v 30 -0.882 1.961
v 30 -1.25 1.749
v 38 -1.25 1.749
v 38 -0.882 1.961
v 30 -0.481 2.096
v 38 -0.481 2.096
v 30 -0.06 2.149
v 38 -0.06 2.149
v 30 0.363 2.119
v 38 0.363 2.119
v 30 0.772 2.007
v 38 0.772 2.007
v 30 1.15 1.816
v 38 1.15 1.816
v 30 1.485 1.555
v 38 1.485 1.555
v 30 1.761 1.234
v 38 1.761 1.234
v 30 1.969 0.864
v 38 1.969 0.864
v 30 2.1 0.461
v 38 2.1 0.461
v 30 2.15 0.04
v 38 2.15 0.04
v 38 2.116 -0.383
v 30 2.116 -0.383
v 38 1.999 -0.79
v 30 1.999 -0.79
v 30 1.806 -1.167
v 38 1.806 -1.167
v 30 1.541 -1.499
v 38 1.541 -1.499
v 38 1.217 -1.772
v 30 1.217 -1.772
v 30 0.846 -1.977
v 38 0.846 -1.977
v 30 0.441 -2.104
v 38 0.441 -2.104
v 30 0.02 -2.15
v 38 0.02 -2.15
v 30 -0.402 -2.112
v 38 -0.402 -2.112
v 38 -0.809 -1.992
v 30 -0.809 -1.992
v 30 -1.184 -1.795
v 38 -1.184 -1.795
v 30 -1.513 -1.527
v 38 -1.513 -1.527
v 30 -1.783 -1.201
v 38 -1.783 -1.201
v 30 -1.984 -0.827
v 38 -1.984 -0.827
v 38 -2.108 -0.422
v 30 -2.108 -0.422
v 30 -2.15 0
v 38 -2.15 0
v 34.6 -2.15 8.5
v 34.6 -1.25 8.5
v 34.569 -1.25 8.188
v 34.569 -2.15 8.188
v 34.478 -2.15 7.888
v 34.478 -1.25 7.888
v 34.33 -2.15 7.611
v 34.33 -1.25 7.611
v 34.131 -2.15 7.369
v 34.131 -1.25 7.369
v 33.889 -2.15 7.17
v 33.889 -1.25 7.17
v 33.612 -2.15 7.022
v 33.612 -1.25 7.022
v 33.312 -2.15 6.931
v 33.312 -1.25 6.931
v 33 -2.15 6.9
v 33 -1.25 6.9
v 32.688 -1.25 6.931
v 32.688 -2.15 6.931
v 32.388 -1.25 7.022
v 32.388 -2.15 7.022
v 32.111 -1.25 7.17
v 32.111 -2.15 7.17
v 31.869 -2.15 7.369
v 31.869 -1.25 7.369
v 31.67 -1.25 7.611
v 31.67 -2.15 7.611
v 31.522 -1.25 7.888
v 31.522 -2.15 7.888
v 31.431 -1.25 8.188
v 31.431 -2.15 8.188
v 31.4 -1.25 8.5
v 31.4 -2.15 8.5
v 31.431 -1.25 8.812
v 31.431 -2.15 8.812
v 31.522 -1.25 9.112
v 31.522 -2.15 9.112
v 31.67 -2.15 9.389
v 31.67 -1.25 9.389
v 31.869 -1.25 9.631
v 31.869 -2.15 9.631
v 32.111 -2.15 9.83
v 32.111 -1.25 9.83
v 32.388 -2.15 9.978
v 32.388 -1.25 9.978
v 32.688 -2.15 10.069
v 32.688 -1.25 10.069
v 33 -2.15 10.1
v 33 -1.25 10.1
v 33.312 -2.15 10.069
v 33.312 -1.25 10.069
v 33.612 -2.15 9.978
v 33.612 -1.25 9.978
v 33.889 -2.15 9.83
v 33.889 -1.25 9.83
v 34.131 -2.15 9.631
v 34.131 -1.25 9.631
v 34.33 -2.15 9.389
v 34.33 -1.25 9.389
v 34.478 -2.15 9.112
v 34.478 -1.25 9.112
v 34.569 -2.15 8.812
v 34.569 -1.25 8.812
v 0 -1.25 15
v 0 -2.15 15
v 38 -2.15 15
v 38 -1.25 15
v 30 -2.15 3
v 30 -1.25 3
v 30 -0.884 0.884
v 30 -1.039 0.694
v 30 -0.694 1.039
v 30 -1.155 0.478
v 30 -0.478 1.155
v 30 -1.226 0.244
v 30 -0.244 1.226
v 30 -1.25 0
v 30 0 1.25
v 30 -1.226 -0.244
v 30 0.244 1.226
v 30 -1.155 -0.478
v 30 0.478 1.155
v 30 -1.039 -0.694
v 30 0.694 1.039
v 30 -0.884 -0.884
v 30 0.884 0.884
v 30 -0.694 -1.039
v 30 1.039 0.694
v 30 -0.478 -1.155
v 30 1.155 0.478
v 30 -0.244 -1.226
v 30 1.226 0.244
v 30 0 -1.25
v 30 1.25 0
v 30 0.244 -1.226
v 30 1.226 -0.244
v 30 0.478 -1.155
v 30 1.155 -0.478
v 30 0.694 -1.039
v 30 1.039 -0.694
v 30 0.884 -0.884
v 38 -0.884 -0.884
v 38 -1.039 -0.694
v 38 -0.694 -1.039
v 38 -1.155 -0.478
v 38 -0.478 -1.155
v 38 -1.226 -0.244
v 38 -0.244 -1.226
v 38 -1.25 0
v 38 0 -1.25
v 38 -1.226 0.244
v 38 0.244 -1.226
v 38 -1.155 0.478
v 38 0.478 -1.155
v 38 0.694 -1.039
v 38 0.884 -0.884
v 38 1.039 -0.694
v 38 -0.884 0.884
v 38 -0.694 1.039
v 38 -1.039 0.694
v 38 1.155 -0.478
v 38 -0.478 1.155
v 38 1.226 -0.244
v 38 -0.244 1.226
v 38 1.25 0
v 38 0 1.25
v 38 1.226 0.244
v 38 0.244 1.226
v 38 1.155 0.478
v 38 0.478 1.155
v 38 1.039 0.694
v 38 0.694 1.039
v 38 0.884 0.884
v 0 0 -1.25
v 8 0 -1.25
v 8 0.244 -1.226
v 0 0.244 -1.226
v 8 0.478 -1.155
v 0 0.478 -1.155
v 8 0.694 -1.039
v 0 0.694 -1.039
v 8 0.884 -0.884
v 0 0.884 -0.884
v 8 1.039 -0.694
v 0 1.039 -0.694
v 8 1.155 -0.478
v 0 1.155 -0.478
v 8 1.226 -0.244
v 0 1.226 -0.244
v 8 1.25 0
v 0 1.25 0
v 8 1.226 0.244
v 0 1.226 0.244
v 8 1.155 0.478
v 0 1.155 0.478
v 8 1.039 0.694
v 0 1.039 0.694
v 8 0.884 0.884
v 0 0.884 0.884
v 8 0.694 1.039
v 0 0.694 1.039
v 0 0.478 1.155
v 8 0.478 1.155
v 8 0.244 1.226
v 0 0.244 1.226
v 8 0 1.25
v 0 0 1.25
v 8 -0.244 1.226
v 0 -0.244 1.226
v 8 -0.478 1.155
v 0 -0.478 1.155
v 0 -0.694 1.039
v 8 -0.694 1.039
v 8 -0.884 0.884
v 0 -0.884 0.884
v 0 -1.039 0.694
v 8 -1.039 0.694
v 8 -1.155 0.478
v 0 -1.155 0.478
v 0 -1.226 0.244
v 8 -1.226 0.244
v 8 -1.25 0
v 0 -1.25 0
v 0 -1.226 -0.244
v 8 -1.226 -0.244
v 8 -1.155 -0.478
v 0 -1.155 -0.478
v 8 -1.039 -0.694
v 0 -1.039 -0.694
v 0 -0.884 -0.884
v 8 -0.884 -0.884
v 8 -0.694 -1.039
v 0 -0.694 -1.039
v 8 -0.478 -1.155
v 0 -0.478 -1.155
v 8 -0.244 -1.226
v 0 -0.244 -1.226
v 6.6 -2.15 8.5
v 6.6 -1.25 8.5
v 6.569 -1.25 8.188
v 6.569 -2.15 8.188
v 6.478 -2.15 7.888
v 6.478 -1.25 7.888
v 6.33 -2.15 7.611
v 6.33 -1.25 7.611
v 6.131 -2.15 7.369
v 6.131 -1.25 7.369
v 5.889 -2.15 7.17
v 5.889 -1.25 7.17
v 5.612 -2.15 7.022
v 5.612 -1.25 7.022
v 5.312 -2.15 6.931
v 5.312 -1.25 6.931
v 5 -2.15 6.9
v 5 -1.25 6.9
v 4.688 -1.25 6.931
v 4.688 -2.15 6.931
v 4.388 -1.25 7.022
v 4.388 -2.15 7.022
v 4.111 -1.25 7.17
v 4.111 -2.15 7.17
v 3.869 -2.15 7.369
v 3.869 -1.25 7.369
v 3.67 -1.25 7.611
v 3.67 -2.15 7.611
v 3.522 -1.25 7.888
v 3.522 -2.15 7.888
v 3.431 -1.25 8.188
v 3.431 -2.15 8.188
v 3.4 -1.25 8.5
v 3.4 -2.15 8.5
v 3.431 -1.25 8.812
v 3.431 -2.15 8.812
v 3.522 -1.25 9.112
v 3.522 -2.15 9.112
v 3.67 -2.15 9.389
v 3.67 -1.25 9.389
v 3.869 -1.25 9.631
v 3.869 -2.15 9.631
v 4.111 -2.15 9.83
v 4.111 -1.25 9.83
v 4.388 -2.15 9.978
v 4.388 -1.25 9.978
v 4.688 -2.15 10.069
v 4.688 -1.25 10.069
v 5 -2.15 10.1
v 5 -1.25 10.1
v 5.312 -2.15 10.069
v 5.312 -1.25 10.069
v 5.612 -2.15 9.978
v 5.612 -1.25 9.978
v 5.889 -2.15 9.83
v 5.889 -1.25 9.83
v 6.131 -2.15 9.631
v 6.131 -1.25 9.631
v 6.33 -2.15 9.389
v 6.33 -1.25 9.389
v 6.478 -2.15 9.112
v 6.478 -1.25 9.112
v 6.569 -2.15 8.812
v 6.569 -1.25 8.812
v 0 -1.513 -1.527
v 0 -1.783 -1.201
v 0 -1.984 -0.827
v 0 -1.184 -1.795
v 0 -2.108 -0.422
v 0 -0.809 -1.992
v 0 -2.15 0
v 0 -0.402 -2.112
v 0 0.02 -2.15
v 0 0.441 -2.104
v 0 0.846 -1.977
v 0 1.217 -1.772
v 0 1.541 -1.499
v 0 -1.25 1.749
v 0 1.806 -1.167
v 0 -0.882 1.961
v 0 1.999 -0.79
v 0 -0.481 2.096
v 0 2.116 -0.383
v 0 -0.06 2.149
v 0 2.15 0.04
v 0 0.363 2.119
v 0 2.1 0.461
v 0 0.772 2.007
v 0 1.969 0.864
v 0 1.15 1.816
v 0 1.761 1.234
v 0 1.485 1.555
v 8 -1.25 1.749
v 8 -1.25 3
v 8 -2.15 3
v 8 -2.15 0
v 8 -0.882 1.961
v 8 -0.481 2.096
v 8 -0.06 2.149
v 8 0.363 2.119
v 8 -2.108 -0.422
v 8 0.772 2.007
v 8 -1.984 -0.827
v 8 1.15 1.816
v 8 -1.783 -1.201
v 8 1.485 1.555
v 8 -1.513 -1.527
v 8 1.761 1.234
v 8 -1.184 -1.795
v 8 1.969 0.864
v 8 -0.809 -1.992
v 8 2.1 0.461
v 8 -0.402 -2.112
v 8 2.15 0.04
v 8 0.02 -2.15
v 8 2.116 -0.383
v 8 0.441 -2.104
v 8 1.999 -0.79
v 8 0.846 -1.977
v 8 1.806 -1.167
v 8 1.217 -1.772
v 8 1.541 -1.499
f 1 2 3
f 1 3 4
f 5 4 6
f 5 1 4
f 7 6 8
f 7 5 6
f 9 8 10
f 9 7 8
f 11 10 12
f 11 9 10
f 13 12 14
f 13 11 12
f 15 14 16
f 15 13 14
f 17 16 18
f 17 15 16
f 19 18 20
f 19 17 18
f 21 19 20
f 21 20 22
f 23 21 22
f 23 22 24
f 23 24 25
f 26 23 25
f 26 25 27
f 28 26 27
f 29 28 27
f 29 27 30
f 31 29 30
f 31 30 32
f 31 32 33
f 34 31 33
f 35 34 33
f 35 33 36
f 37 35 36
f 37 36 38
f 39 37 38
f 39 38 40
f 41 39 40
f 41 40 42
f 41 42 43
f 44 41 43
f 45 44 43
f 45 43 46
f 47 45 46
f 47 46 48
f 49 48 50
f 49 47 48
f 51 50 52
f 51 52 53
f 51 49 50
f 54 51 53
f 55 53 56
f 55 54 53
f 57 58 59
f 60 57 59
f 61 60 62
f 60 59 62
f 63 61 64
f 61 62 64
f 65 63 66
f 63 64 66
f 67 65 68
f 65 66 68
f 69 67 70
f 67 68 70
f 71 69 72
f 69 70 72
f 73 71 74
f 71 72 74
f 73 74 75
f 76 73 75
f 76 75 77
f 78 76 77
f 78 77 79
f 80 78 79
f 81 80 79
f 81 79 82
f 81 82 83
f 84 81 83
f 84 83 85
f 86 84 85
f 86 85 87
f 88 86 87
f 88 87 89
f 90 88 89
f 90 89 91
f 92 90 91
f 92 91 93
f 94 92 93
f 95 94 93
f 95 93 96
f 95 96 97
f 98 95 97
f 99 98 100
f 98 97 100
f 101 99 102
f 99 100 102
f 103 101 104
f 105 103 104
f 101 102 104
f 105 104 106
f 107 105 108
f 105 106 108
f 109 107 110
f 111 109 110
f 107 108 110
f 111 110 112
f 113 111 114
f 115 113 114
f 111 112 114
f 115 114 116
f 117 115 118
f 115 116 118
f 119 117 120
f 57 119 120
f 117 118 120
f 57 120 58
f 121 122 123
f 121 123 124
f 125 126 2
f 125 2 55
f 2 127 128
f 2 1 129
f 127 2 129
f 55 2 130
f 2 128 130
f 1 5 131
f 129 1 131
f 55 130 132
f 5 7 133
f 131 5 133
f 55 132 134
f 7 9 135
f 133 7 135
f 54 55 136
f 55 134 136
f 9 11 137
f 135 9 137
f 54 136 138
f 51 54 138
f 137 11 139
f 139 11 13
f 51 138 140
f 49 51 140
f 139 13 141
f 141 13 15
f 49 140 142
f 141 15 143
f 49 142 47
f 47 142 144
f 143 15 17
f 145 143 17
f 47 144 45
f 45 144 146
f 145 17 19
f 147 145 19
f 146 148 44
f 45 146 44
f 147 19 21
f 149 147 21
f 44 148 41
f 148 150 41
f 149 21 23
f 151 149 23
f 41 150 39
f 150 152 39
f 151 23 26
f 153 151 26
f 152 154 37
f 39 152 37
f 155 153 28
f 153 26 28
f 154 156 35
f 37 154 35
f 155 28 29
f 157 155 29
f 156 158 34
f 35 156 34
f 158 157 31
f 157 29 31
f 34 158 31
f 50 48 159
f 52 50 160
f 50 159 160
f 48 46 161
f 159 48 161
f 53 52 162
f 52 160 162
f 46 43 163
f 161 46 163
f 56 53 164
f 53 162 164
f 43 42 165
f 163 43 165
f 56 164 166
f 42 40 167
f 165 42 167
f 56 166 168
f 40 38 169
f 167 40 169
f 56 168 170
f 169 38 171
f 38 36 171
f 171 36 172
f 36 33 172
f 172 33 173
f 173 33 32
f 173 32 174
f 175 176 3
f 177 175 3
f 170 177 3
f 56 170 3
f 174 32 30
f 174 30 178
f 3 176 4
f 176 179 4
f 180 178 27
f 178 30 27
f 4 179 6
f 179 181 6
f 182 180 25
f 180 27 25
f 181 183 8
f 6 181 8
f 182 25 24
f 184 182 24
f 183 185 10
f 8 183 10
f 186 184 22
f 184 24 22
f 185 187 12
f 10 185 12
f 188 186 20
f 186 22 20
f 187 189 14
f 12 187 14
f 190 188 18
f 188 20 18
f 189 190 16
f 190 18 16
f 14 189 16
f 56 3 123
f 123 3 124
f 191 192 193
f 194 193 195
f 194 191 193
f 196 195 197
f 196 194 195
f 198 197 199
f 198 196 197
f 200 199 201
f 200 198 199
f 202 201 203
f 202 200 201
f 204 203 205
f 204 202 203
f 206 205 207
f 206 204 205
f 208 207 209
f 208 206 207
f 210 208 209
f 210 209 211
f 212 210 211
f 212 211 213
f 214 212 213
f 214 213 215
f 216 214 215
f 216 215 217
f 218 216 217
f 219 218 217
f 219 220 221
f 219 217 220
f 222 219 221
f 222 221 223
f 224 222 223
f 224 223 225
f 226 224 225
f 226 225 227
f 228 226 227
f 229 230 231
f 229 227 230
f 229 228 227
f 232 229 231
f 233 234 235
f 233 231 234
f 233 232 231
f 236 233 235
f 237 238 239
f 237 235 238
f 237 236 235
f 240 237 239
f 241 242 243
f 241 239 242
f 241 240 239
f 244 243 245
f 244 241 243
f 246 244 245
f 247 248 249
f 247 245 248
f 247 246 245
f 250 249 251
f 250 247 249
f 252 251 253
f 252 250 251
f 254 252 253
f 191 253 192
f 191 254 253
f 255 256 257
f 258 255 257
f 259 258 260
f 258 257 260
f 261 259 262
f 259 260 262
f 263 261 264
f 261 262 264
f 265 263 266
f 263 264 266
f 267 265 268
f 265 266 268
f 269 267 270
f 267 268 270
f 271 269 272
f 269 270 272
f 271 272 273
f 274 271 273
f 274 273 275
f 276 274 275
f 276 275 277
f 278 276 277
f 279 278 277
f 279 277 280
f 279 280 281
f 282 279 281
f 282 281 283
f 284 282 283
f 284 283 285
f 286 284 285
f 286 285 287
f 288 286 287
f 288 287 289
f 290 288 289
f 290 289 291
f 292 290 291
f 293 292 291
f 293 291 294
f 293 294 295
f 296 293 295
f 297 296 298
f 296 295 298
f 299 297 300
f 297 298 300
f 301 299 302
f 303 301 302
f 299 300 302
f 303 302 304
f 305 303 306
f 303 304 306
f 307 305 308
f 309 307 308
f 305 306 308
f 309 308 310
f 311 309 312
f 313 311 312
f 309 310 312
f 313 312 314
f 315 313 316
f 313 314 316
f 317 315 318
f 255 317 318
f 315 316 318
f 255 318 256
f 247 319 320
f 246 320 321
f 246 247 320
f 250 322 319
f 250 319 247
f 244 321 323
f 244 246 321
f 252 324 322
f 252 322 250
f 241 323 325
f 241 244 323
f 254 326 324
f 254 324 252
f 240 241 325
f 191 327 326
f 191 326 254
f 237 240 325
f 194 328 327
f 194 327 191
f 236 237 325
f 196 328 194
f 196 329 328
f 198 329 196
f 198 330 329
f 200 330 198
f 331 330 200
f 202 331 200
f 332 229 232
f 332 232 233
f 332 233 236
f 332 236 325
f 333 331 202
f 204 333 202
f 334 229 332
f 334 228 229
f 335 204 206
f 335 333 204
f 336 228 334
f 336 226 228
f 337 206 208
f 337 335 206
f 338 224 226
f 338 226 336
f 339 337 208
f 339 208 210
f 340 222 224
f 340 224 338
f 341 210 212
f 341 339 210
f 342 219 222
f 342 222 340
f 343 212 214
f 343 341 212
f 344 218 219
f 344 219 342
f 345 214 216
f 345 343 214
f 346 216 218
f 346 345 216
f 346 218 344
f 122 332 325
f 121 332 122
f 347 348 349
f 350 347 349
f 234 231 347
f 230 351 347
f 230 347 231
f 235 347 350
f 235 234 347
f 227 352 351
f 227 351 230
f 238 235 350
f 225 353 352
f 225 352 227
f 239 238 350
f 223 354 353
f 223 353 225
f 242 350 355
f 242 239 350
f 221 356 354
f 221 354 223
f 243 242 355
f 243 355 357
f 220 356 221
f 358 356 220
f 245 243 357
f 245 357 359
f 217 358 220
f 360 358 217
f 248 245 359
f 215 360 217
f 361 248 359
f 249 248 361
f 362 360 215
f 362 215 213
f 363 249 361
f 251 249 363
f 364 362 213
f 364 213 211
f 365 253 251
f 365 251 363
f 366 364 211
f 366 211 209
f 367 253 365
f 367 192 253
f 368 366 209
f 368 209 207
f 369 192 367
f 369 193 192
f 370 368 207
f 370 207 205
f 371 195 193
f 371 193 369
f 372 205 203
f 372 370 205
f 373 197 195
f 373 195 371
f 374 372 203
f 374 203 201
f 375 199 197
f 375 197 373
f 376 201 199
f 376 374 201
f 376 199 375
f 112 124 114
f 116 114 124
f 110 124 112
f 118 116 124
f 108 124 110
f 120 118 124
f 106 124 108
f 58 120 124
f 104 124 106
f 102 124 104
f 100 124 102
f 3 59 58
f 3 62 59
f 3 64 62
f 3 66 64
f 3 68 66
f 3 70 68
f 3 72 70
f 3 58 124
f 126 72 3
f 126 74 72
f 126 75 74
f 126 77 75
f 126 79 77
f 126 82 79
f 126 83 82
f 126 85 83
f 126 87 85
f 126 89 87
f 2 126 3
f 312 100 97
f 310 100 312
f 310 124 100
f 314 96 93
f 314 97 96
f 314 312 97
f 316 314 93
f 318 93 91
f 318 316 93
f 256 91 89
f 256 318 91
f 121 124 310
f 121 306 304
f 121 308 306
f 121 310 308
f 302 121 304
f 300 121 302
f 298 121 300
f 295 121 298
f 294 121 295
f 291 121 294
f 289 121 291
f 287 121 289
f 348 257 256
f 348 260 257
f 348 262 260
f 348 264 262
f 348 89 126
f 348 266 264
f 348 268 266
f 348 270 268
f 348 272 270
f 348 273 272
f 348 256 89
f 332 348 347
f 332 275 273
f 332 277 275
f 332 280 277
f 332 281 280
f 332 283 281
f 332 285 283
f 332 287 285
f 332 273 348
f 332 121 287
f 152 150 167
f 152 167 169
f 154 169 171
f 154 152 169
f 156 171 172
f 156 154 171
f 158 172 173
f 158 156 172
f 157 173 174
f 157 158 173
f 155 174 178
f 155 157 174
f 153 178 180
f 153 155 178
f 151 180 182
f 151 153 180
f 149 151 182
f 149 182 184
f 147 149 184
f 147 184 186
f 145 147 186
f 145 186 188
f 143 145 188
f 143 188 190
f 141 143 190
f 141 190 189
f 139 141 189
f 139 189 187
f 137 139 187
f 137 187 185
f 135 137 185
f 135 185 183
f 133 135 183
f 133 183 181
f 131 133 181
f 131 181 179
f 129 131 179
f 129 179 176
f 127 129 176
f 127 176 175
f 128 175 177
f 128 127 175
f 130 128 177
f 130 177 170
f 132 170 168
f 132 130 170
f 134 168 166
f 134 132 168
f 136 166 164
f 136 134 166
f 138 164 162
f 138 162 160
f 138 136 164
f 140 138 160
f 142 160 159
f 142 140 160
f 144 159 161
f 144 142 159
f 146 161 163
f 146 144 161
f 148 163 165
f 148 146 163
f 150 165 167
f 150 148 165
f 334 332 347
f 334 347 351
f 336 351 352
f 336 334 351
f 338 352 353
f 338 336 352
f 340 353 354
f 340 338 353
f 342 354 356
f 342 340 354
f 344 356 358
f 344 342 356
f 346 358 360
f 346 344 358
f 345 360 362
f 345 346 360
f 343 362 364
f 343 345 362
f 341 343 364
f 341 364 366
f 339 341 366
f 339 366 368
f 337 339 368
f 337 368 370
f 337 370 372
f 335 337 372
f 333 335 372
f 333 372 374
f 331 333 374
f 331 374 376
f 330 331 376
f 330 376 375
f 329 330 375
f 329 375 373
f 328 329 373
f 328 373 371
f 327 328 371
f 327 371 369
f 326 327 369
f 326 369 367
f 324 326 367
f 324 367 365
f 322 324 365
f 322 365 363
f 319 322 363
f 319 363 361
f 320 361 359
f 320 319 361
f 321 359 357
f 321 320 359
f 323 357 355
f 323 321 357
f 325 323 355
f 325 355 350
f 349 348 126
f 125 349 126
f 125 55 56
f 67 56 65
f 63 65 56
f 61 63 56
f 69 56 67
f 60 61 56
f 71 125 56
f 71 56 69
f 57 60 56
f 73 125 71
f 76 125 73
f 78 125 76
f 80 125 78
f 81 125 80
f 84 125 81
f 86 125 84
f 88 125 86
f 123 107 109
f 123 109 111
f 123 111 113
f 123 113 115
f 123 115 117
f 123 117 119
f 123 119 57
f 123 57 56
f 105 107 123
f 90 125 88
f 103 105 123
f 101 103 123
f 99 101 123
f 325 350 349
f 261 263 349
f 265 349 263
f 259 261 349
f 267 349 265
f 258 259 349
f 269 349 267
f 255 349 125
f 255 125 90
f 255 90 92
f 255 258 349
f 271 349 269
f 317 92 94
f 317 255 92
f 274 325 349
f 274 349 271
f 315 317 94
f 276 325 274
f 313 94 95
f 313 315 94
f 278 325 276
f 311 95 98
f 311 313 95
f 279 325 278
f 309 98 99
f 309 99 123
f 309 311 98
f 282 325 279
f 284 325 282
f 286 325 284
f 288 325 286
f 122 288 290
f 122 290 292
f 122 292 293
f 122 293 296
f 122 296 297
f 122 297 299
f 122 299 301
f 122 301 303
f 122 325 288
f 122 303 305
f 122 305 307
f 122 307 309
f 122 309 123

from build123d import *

# Parameters (mm, degrees)
SKETCH_1_R          = 1.25
EXTRUDE_1_DEPTH     = 38
SKETCH_2_R          = 1.6
SKETCH_2_W          = 22
SKETCH_2_H          = 7.890130192
CUT_EXTRUDE_1_DEPTH = 19


with BuildPart() as part:
    # 草图1 → 凸台-拉伸1 (new body)
    with BuildSketch(Plane(origin=(0, 0, 0), x_dir=(0, 0, -1), z_dir=(1, 0, 0))):
        with BuildLine():
            Line((0, -2.15), (-15, -2.15))
            Line((-15, -2.15), (-15, -1.25))
            Line((-15, -1.25), (-1.749285568, -1.25))
            ThreePointArc((-1.749285568, -1.25), (0.983615779, 1.911805429), (0, -2.15))
        make_face()
        Circle(SKETCH_1_R, mode=Mode.SUBTRACT)
    extrude(amount=EXTRUDE_1_DEPTH)

    # 草图2 → 切除-拉伸1 (cut, symmetric)
    with BuildSketch(Plane(origin=(0, 0, 0), x_dir=(1, 0, 0), z_dir=(0, 1, 0))):
        with Locations((33, -8.5)):
            Circle(SKETCH_2_R)
        with Locations((5, -8.5)):
            Circle(SKETCH_2_R)
        with Locations((19, 0.945065096)):
            Rectangle(SKETCH_2_W, SKETCH_2_H)
    extrude(amount=CUT_EXTRUDE_1_DEPTH, both=True, mode=Mode.SUBTRACT)


solid = part.part
